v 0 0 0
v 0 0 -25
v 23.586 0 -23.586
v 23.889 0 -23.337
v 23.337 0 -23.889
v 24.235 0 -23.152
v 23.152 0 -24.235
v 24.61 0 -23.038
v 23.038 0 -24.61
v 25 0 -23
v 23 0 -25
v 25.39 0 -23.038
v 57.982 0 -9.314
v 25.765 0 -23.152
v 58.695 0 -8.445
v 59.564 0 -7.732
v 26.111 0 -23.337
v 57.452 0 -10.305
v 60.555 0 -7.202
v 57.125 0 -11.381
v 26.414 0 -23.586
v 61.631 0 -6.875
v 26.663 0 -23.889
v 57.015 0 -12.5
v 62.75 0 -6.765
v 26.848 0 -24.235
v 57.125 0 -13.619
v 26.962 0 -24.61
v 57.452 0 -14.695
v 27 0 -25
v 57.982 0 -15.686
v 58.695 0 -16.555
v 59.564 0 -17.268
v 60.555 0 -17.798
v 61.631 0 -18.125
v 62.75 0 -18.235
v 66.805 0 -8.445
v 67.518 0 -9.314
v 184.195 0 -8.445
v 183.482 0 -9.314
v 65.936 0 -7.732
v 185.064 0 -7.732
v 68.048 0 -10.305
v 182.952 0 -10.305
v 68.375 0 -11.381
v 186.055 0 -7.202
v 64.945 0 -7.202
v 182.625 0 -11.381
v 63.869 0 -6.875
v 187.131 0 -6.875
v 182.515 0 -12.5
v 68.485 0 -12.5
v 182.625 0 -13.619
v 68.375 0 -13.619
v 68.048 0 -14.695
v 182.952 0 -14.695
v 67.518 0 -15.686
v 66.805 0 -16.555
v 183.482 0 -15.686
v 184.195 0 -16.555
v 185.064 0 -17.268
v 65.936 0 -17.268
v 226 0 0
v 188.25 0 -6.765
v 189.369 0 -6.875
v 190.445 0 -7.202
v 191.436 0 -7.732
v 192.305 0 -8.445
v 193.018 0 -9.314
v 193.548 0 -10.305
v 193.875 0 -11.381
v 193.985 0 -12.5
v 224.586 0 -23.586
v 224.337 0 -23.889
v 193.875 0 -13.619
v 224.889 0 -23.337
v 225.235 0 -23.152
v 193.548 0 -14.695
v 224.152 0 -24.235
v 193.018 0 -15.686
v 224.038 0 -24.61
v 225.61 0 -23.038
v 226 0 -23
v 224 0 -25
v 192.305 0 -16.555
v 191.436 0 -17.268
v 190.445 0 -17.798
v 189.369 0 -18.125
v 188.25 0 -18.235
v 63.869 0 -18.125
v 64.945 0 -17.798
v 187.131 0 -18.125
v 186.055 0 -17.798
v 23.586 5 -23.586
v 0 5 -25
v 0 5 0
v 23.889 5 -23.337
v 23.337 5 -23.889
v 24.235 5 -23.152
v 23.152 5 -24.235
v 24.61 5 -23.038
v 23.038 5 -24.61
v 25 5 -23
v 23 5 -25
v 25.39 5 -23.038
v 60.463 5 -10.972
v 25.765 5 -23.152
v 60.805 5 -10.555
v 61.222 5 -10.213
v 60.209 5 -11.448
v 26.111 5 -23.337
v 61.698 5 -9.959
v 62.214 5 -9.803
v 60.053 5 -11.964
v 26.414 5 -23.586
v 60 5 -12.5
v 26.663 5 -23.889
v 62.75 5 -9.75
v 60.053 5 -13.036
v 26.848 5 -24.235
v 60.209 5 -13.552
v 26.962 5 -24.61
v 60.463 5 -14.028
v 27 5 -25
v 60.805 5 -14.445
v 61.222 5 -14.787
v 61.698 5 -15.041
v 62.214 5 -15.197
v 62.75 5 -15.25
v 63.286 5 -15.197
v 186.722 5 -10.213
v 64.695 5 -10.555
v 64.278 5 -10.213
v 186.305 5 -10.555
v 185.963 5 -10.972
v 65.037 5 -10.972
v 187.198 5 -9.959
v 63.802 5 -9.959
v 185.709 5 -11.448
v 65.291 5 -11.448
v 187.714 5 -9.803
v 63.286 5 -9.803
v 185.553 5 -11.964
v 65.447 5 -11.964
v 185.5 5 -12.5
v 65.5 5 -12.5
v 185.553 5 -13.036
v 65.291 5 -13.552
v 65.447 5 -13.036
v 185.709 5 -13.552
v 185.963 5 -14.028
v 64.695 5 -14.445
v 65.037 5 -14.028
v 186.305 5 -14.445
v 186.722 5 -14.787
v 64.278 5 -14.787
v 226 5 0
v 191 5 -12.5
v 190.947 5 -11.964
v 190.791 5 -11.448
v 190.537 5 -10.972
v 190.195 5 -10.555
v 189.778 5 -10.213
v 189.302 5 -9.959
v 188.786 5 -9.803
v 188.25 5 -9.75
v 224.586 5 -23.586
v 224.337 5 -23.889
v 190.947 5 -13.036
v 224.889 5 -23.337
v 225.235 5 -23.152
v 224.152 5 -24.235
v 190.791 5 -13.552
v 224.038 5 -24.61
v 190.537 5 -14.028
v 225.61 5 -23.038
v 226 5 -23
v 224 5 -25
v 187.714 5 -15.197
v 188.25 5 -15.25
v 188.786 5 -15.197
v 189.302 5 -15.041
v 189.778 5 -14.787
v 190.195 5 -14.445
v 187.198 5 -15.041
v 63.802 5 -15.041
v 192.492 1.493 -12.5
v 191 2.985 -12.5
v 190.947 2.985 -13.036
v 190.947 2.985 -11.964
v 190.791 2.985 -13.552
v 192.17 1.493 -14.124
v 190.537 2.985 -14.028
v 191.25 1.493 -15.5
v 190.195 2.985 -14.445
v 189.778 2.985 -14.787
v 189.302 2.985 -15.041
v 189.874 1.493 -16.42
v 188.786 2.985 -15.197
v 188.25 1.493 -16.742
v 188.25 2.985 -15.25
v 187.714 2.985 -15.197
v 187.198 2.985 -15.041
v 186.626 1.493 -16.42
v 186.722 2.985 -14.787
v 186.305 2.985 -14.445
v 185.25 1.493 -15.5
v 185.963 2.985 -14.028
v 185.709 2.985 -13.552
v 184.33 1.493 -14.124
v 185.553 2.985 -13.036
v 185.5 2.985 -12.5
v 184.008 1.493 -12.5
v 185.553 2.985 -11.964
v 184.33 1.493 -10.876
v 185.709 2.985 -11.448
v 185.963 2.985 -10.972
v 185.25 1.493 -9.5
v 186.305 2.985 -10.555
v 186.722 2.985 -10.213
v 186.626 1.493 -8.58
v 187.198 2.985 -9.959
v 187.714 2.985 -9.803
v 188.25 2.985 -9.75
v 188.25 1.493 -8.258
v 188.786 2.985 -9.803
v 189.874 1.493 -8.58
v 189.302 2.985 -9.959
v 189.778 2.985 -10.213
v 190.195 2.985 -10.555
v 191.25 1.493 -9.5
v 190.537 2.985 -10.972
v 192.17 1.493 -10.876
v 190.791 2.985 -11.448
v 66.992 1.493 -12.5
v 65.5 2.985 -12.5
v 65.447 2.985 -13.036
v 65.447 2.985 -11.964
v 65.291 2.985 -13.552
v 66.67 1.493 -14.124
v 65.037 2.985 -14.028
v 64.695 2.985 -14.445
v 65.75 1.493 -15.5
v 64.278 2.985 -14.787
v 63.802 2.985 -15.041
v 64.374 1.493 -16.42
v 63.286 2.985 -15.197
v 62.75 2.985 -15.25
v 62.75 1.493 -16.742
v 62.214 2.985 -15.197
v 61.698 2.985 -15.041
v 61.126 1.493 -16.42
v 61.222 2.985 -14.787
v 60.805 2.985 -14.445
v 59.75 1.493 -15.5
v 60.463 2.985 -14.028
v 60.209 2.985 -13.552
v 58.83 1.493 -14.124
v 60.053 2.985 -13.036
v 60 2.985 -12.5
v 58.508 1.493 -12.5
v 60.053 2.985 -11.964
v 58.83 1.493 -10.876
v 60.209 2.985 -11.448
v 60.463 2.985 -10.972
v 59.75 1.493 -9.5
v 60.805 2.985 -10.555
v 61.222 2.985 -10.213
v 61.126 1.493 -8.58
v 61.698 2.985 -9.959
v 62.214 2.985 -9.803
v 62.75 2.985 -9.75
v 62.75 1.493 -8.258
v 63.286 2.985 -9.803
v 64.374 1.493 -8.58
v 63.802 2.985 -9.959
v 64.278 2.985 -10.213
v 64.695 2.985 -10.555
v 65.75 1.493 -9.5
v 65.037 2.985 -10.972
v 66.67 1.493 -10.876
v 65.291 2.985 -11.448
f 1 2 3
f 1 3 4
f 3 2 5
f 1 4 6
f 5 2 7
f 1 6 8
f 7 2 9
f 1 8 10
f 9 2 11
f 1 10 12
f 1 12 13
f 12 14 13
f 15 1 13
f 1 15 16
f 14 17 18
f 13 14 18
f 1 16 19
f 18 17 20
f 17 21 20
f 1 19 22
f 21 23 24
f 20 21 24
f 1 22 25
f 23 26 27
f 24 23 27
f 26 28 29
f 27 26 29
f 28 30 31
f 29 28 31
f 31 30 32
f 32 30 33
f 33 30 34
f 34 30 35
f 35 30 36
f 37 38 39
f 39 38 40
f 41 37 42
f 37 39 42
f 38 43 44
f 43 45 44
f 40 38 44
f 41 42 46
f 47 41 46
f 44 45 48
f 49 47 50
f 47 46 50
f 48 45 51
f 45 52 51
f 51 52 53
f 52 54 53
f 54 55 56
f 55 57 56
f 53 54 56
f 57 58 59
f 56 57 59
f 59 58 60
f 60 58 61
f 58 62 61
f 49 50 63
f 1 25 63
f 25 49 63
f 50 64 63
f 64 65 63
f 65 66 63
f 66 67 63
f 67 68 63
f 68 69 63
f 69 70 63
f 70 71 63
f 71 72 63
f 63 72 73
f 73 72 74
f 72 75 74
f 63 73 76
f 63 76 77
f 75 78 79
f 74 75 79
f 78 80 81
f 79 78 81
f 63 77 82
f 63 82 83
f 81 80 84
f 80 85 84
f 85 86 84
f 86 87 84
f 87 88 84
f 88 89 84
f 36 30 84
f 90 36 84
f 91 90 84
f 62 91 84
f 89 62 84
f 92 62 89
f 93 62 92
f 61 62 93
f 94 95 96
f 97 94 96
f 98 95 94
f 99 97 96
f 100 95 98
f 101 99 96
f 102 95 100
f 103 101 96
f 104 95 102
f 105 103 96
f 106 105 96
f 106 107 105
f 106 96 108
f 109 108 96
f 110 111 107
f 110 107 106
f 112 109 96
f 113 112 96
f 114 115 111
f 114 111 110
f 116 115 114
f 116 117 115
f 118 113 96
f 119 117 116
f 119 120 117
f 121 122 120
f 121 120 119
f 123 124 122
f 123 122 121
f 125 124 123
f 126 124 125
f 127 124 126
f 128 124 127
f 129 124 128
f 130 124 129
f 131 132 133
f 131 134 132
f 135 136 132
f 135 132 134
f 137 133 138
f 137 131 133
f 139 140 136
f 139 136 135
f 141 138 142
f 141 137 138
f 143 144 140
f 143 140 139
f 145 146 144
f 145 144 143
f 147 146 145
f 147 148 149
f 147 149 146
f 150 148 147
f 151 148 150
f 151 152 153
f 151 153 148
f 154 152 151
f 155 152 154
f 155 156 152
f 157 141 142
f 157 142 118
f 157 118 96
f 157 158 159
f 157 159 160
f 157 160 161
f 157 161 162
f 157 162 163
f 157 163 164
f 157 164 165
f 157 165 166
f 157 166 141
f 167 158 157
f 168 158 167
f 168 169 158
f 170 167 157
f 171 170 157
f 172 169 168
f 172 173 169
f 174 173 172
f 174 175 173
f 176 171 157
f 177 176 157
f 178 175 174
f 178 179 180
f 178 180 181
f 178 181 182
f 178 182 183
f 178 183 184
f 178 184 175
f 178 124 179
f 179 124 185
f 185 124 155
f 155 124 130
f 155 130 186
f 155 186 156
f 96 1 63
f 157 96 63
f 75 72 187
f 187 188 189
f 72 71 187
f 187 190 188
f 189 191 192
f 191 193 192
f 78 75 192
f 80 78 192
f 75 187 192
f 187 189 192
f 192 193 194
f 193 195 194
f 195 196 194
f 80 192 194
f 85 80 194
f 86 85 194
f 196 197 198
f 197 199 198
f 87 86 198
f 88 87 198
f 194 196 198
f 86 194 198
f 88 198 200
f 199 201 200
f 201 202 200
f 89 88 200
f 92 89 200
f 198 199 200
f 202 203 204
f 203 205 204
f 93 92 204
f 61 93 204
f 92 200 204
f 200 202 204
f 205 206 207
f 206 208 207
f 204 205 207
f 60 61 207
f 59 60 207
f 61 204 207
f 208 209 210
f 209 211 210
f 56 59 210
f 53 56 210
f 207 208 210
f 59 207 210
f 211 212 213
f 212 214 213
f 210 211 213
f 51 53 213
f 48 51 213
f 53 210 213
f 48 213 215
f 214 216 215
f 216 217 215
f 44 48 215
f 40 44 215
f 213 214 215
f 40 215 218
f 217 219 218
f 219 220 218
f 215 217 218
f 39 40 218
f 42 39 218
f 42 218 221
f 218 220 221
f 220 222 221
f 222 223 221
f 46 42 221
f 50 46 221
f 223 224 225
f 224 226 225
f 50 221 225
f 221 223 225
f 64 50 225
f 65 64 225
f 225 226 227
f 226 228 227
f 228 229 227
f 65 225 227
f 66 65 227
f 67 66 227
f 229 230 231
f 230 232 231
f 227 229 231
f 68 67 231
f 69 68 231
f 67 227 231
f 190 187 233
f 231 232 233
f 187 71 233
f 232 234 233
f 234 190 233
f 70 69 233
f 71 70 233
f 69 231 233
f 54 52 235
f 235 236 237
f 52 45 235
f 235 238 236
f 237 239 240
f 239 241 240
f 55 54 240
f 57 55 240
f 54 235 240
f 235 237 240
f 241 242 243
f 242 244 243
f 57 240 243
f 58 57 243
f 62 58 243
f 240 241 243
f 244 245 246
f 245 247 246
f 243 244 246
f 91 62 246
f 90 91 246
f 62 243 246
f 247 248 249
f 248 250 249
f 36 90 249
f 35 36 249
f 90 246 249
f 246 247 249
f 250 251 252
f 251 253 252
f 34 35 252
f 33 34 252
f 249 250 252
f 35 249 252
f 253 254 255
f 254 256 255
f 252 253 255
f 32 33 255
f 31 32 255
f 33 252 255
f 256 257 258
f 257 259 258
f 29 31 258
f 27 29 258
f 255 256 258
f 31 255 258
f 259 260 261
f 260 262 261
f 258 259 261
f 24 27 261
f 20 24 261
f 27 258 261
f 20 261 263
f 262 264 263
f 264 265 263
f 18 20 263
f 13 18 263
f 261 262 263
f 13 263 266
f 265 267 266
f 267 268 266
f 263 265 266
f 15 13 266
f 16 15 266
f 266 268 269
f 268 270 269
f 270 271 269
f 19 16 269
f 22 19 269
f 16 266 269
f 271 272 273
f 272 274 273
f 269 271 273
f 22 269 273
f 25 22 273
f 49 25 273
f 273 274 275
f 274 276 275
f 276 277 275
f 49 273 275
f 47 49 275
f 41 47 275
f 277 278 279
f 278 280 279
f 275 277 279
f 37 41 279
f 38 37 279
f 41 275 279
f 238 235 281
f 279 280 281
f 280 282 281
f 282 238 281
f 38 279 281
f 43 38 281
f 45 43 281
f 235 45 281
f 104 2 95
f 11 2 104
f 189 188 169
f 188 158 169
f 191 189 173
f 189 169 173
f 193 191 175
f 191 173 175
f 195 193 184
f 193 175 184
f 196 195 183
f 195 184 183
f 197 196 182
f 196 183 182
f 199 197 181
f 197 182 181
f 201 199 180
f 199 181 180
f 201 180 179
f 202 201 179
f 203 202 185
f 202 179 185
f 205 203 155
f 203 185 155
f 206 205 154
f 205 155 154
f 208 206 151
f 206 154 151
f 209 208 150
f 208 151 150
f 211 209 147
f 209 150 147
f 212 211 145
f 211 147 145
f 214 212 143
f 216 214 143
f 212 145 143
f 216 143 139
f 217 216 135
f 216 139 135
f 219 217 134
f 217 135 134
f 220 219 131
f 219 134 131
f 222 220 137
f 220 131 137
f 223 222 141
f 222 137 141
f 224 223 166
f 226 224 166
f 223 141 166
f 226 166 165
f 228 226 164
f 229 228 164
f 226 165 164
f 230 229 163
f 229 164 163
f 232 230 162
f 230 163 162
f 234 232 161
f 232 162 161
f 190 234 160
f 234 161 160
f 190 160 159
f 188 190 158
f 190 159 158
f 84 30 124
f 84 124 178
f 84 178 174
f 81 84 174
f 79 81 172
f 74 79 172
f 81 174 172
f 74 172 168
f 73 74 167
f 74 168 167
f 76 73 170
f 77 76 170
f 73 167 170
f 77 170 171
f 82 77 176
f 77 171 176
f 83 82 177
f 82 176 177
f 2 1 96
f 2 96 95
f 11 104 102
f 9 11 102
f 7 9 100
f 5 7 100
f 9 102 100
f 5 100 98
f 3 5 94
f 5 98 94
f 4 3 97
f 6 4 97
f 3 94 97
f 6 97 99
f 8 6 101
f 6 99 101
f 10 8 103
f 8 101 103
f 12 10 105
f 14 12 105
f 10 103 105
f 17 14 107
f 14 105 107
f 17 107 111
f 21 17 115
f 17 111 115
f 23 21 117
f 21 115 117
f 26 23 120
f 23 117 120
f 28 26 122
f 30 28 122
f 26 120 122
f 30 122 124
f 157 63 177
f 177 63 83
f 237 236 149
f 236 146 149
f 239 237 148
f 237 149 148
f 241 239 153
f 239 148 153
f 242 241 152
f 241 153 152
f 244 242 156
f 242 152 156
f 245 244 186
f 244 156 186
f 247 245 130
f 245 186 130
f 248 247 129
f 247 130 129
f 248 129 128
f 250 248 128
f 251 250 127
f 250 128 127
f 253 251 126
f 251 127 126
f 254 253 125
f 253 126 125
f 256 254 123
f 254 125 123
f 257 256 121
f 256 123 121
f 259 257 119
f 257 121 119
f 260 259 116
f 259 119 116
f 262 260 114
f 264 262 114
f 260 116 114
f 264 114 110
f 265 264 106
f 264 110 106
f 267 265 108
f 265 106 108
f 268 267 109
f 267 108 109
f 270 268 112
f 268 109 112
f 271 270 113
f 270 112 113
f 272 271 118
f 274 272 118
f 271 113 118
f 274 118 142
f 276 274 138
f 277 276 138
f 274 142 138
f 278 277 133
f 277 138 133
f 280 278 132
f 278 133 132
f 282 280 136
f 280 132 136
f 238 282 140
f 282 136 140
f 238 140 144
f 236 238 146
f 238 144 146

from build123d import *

# Parameters (mm, degrees)
CROQUIS1_W                                           = 226
CROQUIS1_H                                           = 25
SALIENTE_EXTRUIR1_DEPTH                              = 5
CROQUIS2_R                                           = 2
CORTAR_EXTRUIR1_DEPTH                                = 5
AVELLANADO_PARA_TORNILLO_CON_CABEZA_AVEL_D           = 5.5
AVELLANADO_PARA_TORNILLO_CON_CABEZA_AVEL_DEPTH       = 5
AVELLANADO_PARA_TORNILLO_CON_CABEZA_AVEL_CSINK_D     = 11.47
AVELLANADO_PARA_TORNILLO_CON_CABEZA_AVEL_CSINK_ANGLE = 90
AVELLANADO_PARA_TORNILLO_CON_CABEZA_AVEL_TIP         = 1.652366702


with BuildPart() as part:
    # Croquis1 → Saliente-Extruir1 (new body)
    with BuildSketch(Plane(origin=(0, 0, 0), x_dir=(1, 0, 0), z_dir=(0, 1, 0))):
        with Locations((113, 12.5)):
            Rectangle(CROQUIS1_W, CROQUIS1_H)
    extrude(amount=SALIENTE_EXTRUIR1_DEPTH)

    # Croquis2 → Cortar-Extruir1 (cut)
    with BuildSketch(Plane(origin=(0, 5, 0), x_dir=(1, 0, 0), z_dir=(0, 1, 0))):
        with Locations((25, 25)):
            Circle(CROQUIS2_R)
        with Locations((226, 25)):
            Circle(CROQUIS2_R)
    extrude(amount=-CORTAR_EXTRUIR1_DEPTH, mode=Mode.SUBTRACT)

    # Avellanado para tornillo con cabeza avellanada de clavija hexagonal de M51
    with Locations(Plane(origin=(0, 0, 0), x_dir=(-1, 0, 0), z_dir=(0, -1, 0))):
        with Locations((-62.75, 12.5), (-188.25, 12.5)):
            CounterSinkHole(AVELLANADO_PARA_TORNILLO_CON_CABEZA_AVEL_D / 2, AVELLANADO_PARA_TORNILLO_CON_CABEZA_AVEL_CSINK_D / 2, depth=AVELLANADO_PARA_TORNILLO_CON_CABEZA_AVEL_DEPTH, counter_sink_angle=AVELLANADO_PARA_TORNILLO_CON_CABEZA_AVEL_CSINK_ANGLE)
            with Locations((0, 0, -(AVELLANADO_PARA_TORNILLO_CON_CABEZA_AVEL_DEPTH + AVELLANADO_PARA_TORNILLO_CON_CABEZA_AVEL_TIP / 2))):  # 118° drill point
                Cone(0, AVELLANADO_PARA_TORNILLO_CON_CABEZA_AVEL_D / 2, AVELLANADO_PARA_TORNILLO_CON_CABEZA_AVEL_TIP, mode=Mode.SUBTRACT)


solid = part.part
